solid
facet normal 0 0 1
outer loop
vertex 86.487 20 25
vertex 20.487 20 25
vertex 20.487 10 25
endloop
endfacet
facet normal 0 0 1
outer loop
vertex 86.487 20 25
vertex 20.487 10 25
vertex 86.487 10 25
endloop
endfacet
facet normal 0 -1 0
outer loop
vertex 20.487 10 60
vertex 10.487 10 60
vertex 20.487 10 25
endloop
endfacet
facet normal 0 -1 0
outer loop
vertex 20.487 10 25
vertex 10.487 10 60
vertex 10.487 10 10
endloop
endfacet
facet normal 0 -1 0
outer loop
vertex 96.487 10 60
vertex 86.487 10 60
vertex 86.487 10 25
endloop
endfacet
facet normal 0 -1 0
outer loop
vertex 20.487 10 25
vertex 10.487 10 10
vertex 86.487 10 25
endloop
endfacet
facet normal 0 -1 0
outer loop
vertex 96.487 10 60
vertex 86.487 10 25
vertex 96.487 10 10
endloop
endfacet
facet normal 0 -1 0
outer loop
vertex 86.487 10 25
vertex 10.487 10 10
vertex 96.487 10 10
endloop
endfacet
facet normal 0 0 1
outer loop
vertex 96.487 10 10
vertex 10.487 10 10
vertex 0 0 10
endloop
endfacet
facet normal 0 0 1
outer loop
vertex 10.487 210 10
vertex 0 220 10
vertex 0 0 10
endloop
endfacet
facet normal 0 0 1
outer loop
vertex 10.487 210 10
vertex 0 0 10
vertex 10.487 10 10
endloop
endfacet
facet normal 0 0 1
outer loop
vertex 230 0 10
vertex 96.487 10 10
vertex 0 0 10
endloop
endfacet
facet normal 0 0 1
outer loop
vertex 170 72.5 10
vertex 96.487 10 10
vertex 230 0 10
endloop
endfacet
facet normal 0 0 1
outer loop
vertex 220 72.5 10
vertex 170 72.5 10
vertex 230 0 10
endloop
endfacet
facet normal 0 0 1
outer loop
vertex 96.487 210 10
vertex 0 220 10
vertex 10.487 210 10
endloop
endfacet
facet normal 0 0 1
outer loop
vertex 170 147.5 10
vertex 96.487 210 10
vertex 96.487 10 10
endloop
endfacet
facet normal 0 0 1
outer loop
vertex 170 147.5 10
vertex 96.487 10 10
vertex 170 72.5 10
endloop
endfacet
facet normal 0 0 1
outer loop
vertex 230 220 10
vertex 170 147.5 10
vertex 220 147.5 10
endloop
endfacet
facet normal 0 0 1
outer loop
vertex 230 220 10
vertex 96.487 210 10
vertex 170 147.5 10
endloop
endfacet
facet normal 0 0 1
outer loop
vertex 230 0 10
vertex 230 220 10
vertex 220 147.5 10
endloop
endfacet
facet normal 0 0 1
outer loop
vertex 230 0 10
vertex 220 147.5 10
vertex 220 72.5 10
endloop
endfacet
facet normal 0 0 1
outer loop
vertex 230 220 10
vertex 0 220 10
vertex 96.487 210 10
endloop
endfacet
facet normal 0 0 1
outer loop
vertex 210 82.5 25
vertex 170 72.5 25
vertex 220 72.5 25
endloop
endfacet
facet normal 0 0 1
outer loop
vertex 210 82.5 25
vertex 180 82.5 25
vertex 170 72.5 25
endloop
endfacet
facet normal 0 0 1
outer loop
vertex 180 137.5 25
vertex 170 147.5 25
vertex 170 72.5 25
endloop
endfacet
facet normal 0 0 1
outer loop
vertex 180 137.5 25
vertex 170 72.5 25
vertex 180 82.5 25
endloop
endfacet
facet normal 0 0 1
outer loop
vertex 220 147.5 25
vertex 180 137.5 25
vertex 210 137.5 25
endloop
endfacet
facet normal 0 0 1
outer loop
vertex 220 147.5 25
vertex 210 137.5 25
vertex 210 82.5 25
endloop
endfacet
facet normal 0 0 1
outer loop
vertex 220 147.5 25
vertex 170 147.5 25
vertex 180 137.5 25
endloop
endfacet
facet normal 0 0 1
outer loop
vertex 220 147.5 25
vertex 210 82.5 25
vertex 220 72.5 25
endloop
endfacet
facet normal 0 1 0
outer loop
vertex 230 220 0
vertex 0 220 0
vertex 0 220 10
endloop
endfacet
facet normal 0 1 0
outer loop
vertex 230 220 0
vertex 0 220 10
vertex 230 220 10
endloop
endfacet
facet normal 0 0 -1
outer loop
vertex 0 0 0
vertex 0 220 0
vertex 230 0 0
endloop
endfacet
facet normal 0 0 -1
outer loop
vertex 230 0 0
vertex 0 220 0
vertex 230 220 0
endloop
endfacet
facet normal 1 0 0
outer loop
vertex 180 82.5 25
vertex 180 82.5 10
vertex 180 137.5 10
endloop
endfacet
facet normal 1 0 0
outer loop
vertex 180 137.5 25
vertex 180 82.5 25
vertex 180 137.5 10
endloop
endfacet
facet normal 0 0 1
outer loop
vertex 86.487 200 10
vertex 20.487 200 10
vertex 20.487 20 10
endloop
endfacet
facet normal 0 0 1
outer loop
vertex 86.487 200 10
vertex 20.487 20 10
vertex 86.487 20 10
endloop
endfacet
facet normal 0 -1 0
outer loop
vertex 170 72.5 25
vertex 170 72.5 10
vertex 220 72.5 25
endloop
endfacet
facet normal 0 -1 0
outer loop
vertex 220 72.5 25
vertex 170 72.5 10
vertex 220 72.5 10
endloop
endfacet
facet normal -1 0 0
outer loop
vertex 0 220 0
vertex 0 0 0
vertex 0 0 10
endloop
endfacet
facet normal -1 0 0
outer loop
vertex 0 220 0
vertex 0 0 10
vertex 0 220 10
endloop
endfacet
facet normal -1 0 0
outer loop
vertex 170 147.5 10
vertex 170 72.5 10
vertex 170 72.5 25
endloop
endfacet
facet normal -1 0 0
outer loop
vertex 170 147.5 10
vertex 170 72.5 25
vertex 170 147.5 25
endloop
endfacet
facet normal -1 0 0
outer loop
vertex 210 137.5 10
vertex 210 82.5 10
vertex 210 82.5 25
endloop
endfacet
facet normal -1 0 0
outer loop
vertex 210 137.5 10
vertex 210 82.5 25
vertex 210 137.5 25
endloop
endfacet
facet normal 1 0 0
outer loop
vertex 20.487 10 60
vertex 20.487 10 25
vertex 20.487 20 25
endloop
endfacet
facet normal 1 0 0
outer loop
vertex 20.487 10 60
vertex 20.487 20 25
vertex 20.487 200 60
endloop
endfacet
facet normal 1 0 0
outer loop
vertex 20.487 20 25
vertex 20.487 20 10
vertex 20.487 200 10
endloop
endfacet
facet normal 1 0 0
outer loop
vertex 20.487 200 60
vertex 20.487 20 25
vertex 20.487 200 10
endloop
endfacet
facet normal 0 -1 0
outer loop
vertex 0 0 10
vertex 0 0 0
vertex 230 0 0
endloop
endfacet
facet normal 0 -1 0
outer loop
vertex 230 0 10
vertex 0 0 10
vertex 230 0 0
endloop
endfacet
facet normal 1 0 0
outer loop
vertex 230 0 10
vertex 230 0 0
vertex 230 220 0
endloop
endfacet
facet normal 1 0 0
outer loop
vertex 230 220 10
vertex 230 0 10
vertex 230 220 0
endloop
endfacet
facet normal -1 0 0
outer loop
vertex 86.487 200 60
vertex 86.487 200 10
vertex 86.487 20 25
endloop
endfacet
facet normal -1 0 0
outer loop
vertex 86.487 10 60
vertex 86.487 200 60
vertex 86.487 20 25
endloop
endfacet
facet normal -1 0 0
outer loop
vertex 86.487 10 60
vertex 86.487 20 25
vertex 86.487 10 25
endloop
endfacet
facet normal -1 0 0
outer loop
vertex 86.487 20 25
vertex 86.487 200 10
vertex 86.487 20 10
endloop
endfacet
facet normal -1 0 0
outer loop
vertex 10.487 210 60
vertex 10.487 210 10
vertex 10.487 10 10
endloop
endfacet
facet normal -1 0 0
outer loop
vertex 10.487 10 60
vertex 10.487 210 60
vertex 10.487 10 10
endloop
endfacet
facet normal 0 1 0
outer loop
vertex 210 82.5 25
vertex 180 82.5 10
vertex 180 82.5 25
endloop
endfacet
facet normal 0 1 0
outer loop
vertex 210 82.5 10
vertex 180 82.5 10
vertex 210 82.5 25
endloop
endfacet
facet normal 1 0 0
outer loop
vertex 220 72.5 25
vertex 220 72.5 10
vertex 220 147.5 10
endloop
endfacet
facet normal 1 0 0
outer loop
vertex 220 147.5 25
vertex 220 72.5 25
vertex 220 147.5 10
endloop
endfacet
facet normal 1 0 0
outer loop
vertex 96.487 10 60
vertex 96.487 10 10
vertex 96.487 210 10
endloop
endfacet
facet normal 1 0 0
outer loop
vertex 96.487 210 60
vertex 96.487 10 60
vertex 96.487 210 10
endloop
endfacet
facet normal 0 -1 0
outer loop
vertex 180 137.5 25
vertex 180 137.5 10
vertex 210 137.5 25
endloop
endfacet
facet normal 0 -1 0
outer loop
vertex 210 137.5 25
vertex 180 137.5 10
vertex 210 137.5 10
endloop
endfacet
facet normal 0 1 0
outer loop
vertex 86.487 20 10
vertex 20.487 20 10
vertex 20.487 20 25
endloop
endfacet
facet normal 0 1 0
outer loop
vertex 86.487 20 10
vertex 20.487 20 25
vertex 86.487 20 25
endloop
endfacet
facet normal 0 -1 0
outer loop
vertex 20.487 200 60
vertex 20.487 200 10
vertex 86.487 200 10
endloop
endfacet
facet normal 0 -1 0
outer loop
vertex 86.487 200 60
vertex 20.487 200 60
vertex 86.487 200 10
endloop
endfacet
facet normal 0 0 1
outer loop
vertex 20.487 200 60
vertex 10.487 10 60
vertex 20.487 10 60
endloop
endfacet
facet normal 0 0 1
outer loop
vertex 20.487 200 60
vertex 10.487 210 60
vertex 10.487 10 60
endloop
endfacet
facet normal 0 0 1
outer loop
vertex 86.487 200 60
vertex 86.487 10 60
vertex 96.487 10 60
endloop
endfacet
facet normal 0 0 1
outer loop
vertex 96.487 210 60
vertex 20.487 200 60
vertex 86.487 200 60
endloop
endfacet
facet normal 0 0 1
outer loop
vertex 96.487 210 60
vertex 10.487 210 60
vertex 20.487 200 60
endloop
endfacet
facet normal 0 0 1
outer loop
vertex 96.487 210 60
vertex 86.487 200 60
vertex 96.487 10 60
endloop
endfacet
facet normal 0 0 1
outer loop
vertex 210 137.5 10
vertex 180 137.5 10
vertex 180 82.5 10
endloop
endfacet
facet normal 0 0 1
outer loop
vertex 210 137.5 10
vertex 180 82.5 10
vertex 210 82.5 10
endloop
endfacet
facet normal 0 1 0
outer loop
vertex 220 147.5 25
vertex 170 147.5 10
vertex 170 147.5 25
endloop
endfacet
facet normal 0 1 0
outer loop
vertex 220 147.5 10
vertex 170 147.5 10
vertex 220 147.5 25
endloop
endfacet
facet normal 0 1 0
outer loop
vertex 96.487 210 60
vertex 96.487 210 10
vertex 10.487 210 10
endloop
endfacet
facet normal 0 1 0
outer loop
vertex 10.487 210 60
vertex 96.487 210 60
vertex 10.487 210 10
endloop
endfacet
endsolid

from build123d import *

# Parameters (mm, degrees)
ESQUISSE1_W        = 230
ESQUISSE1_H        = 220
BOSS_EXTRU_1_DEPTH = 10
BOSS_EXTRU_2_DEPTH = 50
ESQUISSE3_W        = 66
ESQUISSE3_H        = 10
BOSS_EXTRU_3_DEPTH = 15
ESQUISSE4_W        = 50
ESQUISSE4_H        = 75
ESQUISSE4_W_2      = 30
ESQUISSE4_H_2      = 55
BOSS_EXTRU_4_DEPTH = 15


with BuildPart() as part:
    # Esquisse1 → Boss.-Extru.1 (new body)
    with BuildSketch(Plane.XY):
        with Locations((115, 110)):
            Rectangle(ESQUISSE1_W, ESQUISSE1_H)
    extrude(amount=BOSS_EXTRU_1_DEPTH)

    # Esquisse2 → Boss.-Extru.2 (add)
    with BuildSketch(Plane.XY.offset(10)):
        Polygon((10.487156365, 10), (20.487156365, 10), (20.487156365, 200), (86.487156365, 200), (86.487156365, 10), (96.487156365, 10), (96.487156365, 210), (86.487156365, 210), (20.487156365, 210), (10.487156365, 210), align=None)
    extrude(amount=BOSS_EXTRU_2_DEPTH)

    # Esquisse3 → Boss.-Extru.3 (add)
    with BuildSketch(Plane.XY.offset(10)):
        with Locations((53.487156365, 15)):
            Rectangle(ESQUISSE3_W, ESQUISSE3_H)
    extrude(amount=BOSS_EXTRU_3_DEPTH)

    # Esquisse4 → Boss.-Extru.4 (add)
    with BuildSketch(Plane.XY.offset(10)):
        with Locations((195, 110)):
            Rectangle(ESQUISSE4_W, ESQUISSE4_H)
        with Locations((195, 110)):
            Rectangle(ESQUISSE4_W_2, ESQUISSE4_H_2, mode=Mode.SUBTRACT)
    extrude(amount=BOSS_EXTRU_4_DEPTH)


solid = part.part
